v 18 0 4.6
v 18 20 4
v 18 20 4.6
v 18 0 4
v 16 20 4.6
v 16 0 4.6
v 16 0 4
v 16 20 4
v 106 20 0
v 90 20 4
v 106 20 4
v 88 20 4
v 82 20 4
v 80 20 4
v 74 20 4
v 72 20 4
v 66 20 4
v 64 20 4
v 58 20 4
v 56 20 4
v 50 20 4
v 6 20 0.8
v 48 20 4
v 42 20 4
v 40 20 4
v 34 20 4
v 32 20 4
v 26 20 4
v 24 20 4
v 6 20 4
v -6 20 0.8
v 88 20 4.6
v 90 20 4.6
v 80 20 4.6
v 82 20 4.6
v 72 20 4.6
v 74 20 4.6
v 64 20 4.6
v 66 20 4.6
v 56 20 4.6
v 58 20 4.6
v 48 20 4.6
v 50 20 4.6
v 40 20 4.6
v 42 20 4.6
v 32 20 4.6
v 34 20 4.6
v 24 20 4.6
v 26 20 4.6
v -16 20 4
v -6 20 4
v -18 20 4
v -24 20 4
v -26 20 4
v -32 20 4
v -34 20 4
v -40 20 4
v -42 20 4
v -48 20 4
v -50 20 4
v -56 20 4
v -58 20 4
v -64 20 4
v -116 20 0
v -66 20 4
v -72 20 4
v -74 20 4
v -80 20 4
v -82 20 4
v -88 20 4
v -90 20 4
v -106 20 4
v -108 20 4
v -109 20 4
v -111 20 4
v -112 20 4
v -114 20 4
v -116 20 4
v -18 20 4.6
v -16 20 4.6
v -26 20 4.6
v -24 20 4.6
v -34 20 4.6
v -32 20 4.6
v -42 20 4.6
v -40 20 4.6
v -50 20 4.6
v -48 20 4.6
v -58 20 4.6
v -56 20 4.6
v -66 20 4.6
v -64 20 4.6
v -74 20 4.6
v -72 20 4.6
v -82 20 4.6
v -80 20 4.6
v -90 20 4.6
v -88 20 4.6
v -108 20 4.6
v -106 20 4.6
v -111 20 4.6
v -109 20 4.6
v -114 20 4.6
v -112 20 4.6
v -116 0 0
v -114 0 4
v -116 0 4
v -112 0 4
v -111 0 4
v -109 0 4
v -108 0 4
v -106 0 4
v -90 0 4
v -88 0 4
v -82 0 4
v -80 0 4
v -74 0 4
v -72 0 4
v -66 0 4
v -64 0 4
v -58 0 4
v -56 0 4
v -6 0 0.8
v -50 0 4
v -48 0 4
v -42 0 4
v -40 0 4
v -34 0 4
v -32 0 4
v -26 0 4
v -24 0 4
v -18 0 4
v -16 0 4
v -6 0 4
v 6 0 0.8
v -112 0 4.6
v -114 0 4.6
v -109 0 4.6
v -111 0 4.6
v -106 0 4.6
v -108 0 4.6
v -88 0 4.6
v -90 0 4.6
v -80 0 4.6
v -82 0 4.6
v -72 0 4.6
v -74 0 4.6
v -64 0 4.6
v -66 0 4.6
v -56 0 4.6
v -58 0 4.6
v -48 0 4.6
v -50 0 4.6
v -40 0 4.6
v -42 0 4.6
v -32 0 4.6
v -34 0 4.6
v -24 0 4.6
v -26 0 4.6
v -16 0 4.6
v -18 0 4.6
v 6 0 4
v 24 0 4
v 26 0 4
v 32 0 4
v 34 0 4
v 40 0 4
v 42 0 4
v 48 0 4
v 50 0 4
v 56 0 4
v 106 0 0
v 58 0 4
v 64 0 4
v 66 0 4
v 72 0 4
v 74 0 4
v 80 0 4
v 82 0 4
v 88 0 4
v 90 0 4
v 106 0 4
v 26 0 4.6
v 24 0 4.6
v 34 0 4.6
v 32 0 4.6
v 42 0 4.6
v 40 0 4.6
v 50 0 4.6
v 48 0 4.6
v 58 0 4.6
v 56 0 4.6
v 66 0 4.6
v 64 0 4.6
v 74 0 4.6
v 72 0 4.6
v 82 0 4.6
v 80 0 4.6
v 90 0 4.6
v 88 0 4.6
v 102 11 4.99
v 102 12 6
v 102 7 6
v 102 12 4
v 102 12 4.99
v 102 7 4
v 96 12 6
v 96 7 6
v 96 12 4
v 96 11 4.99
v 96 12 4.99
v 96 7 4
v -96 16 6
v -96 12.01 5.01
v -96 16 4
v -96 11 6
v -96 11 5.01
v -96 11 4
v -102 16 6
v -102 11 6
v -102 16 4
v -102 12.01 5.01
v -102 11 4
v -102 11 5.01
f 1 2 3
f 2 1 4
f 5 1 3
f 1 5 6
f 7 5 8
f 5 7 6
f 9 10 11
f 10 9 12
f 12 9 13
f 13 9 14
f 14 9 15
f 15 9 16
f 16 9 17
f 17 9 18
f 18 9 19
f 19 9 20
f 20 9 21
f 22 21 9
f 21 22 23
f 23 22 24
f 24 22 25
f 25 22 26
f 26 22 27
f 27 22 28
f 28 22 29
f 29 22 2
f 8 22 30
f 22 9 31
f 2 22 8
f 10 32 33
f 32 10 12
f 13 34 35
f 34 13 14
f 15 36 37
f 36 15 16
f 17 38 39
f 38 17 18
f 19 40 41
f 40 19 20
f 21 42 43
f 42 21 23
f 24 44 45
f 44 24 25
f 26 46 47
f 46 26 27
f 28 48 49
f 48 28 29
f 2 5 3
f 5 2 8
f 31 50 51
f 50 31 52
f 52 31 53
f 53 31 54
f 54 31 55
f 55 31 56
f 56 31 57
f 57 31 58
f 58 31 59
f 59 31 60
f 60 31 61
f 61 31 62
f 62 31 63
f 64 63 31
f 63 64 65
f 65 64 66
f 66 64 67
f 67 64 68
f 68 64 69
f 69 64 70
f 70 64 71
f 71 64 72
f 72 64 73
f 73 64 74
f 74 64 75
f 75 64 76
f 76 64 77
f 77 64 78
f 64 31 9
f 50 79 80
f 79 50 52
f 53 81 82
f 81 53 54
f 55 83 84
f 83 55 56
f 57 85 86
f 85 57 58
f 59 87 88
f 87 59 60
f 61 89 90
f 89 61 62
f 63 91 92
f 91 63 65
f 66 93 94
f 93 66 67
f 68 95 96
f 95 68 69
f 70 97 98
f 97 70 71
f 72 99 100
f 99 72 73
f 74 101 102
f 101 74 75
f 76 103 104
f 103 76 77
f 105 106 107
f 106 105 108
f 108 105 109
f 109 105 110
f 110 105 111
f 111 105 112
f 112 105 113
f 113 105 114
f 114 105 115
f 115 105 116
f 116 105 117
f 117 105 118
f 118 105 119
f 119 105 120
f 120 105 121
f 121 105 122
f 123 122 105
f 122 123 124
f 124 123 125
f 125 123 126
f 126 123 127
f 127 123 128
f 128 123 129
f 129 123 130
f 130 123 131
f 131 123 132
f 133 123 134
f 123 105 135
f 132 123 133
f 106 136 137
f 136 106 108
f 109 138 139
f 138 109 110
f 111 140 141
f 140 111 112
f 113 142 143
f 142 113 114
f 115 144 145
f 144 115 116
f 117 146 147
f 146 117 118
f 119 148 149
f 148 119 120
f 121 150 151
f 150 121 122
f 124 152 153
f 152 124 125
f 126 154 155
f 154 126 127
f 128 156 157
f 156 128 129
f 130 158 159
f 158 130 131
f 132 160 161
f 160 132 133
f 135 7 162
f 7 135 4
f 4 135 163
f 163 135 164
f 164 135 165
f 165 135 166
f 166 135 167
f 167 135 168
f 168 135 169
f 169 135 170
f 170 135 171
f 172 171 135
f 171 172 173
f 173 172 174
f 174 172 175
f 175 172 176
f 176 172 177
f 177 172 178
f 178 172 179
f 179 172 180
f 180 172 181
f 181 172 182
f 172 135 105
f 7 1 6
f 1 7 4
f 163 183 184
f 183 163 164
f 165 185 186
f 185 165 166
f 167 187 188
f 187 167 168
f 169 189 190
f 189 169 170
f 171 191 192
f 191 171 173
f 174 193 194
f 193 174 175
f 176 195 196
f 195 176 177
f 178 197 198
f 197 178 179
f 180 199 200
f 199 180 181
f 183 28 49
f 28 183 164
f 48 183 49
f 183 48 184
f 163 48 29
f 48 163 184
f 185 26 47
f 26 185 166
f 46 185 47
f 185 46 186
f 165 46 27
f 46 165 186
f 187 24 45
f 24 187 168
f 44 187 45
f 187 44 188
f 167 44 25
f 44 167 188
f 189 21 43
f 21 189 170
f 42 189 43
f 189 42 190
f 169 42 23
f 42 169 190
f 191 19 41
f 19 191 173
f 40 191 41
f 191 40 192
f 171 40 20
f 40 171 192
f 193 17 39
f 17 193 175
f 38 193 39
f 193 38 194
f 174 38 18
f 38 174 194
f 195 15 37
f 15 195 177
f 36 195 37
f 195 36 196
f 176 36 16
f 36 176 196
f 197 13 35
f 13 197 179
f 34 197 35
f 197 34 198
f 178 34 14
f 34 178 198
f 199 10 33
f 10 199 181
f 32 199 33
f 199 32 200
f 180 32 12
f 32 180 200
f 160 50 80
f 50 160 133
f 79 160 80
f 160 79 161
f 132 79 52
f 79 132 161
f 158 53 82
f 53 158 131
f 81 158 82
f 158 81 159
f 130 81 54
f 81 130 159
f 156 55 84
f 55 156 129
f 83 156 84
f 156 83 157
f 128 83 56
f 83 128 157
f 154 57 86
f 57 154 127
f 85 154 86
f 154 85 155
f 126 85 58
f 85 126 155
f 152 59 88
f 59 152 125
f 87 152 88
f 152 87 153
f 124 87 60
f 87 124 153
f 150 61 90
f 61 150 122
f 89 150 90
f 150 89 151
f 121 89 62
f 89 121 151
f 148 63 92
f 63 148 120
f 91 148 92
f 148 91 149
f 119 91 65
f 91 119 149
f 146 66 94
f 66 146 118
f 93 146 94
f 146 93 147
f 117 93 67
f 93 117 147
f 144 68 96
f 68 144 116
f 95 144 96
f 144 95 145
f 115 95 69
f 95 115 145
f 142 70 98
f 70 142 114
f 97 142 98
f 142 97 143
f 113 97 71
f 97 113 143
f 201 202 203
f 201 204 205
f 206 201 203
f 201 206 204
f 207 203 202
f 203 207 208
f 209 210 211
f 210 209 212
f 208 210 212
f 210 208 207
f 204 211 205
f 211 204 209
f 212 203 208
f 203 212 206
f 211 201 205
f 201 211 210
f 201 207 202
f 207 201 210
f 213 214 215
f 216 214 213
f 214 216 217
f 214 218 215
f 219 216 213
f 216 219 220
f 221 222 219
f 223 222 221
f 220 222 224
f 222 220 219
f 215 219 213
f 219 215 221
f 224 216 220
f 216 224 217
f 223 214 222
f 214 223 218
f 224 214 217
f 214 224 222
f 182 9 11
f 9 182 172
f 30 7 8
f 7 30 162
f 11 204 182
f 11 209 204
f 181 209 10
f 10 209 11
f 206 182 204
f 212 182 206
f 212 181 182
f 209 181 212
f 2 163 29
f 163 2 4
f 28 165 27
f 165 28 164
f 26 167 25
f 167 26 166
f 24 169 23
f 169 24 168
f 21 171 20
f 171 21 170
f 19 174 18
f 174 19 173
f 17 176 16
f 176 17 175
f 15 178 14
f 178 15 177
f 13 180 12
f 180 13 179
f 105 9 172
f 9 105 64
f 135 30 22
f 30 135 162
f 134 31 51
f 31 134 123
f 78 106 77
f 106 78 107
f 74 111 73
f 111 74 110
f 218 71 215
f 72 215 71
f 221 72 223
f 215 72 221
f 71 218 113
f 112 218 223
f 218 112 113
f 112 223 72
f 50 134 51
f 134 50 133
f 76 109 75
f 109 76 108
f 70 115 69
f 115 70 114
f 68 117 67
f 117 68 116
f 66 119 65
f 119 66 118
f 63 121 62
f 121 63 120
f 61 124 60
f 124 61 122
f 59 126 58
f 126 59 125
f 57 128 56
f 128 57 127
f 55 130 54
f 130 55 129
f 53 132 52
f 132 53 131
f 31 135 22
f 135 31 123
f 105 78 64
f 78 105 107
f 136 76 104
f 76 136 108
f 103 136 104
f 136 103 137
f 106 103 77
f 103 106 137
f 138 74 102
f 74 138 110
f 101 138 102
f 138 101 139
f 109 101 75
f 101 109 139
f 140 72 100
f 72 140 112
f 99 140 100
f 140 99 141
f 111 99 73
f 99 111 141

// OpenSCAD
// Bag clip with living hinge - PETG, 0.4mm nozzle, no supports
// Printed open flat, closes on 2mm folded bag. Latch hooks shut, thumb tab opens.
// Units: mm. Print orientation: +Z up, rests on z=0.

/* [Parts] */
part = "clip"; // [clip, assembly]

cadverify_only = "";
module instance(name, part, unit = 1) {
    echo(cadverify_instance = [name, part, unit]);
    if (cadverify_only == "" || cadverify_only == name) children();
}

// Parameters
La = 100;      // arm length
W = 20;        // arm width (Y)
Ta = 4;        // arm thickness (Z)
Gh = 12;       // hinge gap in X (-6..6)
Th = 0.8;      // hinge thickness (2x0.4 nozzle)
TabL = 10;     // thumb tab length beyond top arm free end

Xmin = -106 - TabL;  // -116 tab tip
Xmax = 6 + La;       // 106 bottom nose
Ymin = 0; Ymax = W;
Zmin = 0; Zmax = Ta + 2; // 6 latch top

module clip() {
    // bottom arm 6..106
    translate([6, 0, 0]) cube([La, W, Ta]);
    // top arm -106..-6
    translate([-106, 0, 0]) cube([La, W, Ta]);
    // living hinge -6.02..6.02 (overlap into arms), full width, thin
    translate([-Gh/2 - 0.02, 0, 0]) cube([Gh + 0.04, W, Th]);
    // thumb tab -116..-105.98 (overlap into top arm)
    translate([Xmin, 0, 0]) cube([TabL + 0.02, W, Ta]);

    // inner grip teeth 0.6 tall, 2 wide, on inner faces (tops, become inner when closed)
    for (i = [0:9]) translate([16 + i*8, 0, Ta - 0.02]) cube([2, W, 0.62]);
    for (i = [0:9]) translate([-18 - i*8, 0, Ta - 0.02]) cube([2, W, 0.62]);
    // thumb grip ridges on tab top
    translate([-114, 0, Ta - 0.02]) cube([2, W, 0.62]);
    translate([-111, 0, Ta - 0.02]) cube([2, W, 0.62]);
    translate([-108, 0, Ta - 0.02]) cube([2, W, 0.62]);

    // bottom catch block 96..102, 7..12, 3.98..6 with 45deg top-outer chamfer
    difference() {
        translate([96, 7, Ta - 0.02]) cube([6, 5, 2.02]);
        translate([95.99, 0, 11]) rotate([0, 90, 0])
            linear_extrude(height = 6.04)
                polygon(points = [[6.01, 11], [6.01, 12.01], [4.99, 12.01]]);
    }
    // top hook block -102..-96, 11..16, 3.98..6 with 45deg bottom-inner chamfer
    difference() {
        translate([-102, 11, Ta - 0.02]) cube([6, 5, 2.02]);
        translate([-102.02, 0, 9]) rotate([0, 90, 0])
            linear_extrude(height = 6.04)
                polygon(points = [[5.01, 10.99], [3.99, 10.99], [3.99, 12.01]]);
    }
}

module assembly() {
    instance("clip_inst", "clip", 1) clip();
}

if (part == "clip") {
    echo(cadverify_spec = [
        ["bounds", [[Xmin, Ymin, Zmin], [Xmax, Ymax, Zmax]]],
        ["bodies", 1],
        ["support_faces", [["bed", "-z", 4000]]],
        ["overhangs_allowed", [["latch_chamfer_45deg", [[-103, 10, 4], [-95, 13, 6]]]]],
        ["copies", 1],
        ["details", [
            ["bottom_arm", "material", [[6, 0, 0], [106, 20, 4]], 0.9],
            ["top_arm", "material", [[-106, 0, 0], [-6, 20, 4]], 0.9],
            ["thumb_tab", "material", [[-116, 0, 0], [-106, 20, 4]], 0.9],
            ["latch_bottom", "material", [[96, 7, 4], [102, 12, 6]], 0.8],
            ["latch_top", "material", [[-102, 11, 4], [-96, 16, 6]], 0.8],
            ["hinge_gap", "void", [[-6, 0, 0.8], [6, 20, 4]], 0.9],
            ["hinge_thin", "thickness", [0, 10, 5], [0, 0, -1], 0.8],
            ["arm_thickness", "thickness", [60, 10, 10], [0, 0, -1], 4.0],
            ["teeth", "view", [[14, 0, 4], [92, 20, 4.8]]],
            ["latch_detail", "view", [[94, 5, 4], [104, 18, 6]]]
        ]]
    ]);
    clip();
} else if (part == "assembly") {
    echo(cadverify_spec = [
        ["bounds", [[Xmin, Ymin, Zmin], [Xmax, Ymax, Zmax]]],
        ["support_faces", [["bed", "-z", 4000]]],
        ["allowed_interferences", []],
        ["motions", [
            ["closing", ["clip_inst"], "slide", [1, 0, 0], [0, 20]]
        ]],
        ["assembly_order", [
            [["clip_inst"], [0, 0, 0]]
        ]]
    ]);
    assembly();
}
